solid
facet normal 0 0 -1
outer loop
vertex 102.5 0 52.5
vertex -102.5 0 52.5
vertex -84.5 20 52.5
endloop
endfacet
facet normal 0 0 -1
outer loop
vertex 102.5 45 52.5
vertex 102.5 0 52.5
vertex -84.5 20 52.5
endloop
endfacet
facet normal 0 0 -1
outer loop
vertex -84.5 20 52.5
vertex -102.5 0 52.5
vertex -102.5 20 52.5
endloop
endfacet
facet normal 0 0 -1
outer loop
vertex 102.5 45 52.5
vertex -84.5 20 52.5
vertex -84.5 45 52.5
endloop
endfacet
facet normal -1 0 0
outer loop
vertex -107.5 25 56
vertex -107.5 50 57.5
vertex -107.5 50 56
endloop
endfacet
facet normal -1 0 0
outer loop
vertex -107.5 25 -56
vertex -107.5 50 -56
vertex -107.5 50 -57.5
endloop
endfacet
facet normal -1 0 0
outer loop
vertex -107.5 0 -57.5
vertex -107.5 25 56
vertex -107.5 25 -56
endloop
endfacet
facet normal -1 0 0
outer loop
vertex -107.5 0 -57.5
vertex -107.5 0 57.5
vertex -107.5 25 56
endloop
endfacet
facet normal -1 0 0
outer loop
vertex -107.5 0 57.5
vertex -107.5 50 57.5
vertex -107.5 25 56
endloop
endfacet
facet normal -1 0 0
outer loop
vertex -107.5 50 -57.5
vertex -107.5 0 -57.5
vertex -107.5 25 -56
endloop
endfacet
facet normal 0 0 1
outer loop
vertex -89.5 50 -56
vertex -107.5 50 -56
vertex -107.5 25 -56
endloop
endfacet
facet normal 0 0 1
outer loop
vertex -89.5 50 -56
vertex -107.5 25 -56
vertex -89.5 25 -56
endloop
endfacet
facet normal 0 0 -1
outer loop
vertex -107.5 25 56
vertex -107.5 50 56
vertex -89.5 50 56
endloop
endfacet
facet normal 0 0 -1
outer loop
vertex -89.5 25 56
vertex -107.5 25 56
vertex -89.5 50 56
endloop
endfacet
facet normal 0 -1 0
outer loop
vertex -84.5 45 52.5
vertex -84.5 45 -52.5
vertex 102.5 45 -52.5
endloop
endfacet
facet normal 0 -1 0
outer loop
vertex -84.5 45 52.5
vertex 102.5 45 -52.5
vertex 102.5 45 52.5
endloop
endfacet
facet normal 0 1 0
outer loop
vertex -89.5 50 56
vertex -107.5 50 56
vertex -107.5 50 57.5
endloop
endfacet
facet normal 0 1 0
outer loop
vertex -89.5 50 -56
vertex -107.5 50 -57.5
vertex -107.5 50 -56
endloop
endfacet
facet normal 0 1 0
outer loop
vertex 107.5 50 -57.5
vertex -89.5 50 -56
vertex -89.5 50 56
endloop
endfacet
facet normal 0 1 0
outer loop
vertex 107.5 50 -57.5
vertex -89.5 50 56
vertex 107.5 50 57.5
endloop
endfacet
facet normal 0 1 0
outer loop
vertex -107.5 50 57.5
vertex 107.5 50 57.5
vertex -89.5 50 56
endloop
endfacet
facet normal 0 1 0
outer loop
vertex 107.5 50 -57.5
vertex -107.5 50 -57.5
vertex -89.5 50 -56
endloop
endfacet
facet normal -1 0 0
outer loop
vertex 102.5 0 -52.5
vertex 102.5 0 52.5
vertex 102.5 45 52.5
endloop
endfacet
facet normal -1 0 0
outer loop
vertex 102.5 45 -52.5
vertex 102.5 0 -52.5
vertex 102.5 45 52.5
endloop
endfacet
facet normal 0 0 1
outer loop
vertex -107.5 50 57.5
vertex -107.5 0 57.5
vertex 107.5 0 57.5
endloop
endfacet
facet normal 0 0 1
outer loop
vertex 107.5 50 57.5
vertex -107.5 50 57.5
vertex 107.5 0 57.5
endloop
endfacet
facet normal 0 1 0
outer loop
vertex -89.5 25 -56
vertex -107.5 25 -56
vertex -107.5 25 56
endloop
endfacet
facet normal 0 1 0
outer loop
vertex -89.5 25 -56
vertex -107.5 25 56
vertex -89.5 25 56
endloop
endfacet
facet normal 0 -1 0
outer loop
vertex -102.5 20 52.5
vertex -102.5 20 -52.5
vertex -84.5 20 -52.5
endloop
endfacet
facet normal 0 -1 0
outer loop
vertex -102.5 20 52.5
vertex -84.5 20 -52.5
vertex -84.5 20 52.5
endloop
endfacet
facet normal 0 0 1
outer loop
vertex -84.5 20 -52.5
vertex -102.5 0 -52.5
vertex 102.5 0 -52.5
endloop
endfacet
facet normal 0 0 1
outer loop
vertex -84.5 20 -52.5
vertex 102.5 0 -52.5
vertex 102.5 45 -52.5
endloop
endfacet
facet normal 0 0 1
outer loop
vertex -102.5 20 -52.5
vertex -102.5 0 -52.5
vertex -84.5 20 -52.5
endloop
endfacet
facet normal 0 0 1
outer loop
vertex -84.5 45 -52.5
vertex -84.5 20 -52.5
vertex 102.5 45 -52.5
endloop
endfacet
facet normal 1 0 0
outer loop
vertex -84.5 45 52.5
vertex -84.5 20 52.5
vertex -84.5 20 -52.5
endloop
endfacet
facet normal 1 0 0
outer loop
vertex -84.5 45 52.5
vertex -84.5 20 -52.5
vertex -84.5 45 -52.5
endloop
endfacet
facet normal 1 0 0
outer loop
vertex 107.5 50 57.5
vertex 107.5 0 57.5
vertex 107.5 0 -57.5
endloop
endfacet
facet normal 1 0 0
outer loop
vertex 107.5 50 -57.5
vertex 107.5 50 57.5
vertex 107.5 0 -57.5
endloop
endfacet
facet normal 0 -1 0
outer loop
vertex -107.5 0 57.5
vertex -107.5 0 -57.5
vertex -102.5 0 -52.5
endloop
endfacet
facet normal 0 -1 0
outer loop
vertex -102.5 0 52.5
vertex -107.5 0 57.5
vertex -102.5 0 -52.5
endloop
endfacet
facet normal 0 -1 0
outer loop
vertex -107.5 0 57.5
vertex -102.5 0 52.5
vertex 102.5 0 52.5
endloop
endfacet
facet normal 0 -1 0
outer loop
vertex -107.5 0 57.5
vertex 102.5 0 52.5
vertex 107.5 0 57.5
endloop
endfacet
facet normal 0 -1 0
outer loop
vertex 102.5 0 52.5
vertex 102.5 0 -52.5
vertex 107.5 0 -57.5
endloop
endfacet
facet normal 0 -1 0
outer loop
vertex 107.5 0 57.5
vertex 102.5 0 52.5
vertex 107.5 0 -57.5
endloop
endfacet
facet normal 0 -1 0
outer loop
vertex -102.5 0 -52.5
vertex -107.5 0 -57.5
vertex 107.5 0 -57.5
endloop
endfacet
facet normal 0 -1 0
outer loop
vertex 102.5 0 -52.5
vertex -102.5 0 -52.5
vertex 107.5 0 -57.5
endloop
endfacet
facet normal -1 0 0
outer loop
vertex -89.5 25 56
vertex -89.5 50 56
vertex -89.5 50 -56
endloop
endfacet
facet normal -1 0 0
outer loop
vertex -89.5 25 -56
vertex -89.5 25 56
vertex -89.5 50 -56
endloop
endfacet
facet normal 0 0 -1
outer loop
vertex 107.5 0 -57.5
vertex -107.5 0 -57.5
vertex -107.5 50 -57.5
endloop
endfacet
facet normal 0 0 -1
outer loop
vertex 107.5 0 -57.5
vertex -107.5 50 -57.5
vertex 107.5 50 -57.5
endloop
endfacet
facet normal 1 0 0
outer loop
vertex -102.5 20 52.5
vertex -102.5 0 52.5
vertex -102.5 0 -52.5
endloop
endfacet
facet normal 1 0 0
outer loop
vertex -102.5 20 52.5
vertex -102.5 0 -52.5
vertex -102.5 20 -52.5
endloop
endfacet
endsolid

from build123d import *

# Parameters (mm, degrees)
SKETCH1_W           = 215
SKETCH1_H           = 115
BOSS_EXTRUDE1_DEPTH = 50
SKETCH2_W           = 18
SKETCH2_H           = 112
CUT_EXTRUDE2_DEPTH  = 25
SHELL1_START        = -84.5
SHELL1_OUTLINE_W    = 45
SHELL1_OUTLINE_H    = 105
SHELL1_DEPTH        = 187
SHELL1_START_2      = -102.5
SHELL1_2_OUTLINE_W  = 20
SHELL1_2_OUTLINE_H  = 105
SHELL1_2_DEPTH      = 18


# Read off the part's stored shape, not the designer's step: Shell1
with BuildPart() as part:
    # Sketch1 → Boss-Extrude1 (new body)
    with BuildSketch(Plane(origin=(0, 0, 0), x_dir=(1, 0, 0), z_dir=(0, 1, 0))):
        Rectangle(SKETCH1_W, SKETCH1_H)
    extrude(amount=BOSS_EXTRUDE1_DEPTH)

    # Sketch2 → Cut-Extrude2 (cut)
    with BuildSketch(Plane(origin=(0, 50, 0), x_dir=(1, 0, 0), z_dir=(0, 1, 0))):
        with Locations((-98.5, 0)):
            Rectangle(SKETCH2_W, SKETCH2_H)
    extrude(amount=-CUT_EXTRUDE2_DEPTH, mode=Mode.SUBTRACT)

    # Shell1 outline → Shell1 (cut)
    with BuildSketch(Plane.YZ.offset(SHELL1_START)):
        with Locations((22.5, 0)):
            Rectangle(SHELL1_OUTLINE_W, SHELL1_OUTLINE_H)
    extrude(amount=SHELL1_DEPTH, mode=Mode.SUBTRACT)

    # Shell1 2 outline → Shell1 2 (cut)
    with BuildSketch(Plane.YZ.offset(SHELL1_START_2)):
        with Locations((10, 0)):
            Rectangle(SHELL1_2_OUTLINE_W, SHELL1_2_OUTLINE_H)
    extrude(amount=SHELL1_2_DEPTH, mode=Mode.SUBTRACT)


solid = part.part
